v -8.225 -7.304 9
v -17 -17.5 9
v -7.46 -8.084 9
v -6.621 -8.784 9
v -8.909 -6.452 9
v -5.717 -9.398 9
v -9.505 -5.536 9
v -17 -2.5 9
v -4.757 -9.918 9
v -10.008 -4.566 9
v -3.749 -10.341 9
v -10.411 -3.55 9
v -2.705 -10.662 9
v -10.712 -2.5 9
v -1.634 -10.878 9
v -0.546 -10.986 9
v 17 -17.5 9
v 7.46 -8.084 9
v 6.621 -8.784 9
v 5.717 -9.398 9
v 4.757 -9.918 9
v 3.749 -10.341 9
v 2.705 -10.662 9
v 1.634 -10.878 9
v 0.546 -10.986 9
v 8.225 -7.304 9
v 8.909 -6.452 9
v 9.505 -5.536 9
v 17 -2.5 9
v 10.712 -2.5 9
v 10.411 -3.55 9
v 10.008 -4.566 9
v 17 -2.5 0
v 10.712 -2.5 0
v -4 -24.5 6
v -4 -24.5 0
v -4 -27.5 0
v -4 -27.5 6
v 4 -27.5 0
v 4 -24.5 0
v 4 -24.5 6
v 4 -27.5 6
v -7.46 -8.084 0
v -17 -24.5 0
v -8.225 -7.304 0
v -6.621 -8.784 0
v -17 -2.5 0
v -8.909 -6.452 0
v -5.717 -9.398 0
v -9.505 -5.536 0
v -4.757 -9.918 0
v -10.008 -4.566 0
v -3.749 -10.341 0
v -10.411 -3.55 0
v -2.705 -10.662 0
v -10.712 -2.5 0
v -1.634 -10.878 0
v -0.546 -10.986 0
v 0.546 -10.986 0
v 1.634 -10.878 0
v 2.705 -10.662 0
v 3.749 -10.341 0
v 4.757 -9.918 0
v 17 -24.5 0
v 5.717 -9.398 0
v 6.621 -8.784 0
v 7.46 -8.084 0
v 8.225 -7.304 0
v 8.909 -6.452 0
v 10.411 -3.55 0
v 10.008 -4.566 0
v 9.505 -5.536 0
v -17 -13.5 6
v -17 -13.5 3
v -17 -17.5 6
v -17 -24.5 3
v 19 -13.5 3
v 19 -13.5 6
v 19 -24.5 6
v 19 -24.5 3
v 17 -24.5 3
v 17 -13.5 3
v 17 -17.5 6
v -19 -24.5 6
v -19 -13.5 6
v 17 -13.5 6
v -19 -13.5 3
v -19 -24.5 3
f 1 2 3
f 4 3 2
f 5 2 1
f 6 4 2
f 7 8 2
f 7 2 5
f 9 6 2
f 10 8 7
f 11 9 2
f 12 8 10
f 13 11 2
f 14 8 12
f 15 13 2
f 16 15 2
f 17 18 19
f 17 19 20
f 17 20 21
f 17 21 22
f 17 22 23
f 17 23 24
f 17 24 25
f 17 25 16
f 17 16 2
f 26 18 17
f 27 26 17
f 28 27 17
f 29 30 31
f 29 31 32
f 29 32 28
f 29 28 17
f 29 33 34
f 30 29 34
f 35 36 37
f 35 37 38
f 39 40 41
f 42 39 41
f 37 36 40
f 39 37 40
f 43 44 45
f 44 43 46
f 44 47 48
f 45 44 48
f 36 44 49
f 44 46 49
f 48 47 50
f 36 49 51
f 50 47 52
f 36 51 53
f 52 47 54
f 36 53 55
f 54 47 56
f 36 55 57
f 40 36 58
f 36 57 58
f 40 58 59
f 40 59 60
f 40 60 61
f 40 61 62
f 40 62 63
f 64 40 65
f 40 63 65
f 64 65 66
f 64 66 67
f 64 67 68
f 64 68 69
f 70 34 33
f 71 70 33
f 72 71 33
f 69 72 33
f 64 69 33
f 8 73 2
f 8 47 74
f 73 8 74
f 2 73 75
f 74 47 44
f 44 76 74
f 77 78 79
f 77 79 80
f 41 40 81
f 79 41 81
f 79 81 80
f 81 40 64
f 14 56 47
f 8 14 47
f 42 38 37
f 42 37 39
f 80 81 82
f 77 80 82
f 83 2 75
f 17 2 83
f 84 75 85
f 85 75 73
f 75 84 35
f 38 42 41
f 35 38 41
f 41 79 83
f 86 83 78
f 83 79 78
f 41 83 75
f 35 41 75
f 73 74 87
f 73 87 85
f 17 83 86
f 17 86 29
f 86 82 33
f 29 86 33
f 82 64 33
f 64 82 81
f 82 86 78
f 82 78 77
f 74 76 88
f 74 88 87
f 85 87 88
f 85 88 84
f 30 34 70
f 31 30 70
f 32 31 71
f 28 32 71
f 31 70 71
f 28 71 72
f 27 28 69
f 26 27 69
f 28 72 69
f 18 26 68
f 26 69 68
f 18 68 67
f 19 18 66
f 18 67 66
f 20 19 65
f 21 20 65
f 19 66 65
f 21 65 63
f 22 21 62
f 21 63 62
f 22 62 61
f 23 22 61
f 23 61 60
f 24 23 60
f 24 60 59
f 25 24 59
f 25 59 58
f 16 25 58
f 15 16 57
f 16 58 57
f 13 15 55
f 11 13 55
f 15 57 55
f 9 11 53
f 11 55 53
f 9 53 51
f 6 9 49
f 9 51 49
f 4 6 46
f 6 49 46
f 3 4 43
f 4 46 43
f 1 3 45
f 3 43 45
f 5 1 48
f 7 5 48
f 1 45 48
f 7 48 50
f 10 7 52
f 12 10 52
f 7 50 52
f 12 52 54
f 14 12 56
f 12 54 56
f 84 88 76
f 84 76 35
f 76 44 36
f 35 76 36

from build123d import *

# Parameters (mm, degrees)
BOSS_EXTRUDE1_DEPTH = 9
SKETCH2_W           = 8
SKETCH2_H           = 9
BOSS_EXTRUDE2_DEPTH = 3
SKETCH3_W           = 3
SKETCH3_H           = 11
BOSS_EXTRUDE3_DEPTH = 2
SKETCH4_W           = 3
SKETCH4_H           = 11
BOSS_EXTRUDE4_DEPTH = 2
SKETCH6_W           = 34
SKETCH6_H           = 10
CUT_EXTRUDE2_DEPTH  = 3


with BuildPart() as part:
    # Sketch1 → Boss-Extrude1 (new body)
    with BuildSketch(Plane.XY):
        with BuildLine():
            Line((-10.712142643, -2.5), (-17, -2.5))
            Line((-17, -2.5), (-17, -24.5))
            Line((-17, -24.5), (17, -24.5))
            Line((17, -24.5), (17, -2.5))
            Line((17, -2.5), (10.712142643, -2.5))
            ThreePointArc((10.712142643, -2.5), (0, -11), (-10.712142643, -2.5))
        make_face()
    extrude(amount=BOSS_EXTRUDE1_DEPTH)

    # Sketch2 → Boss-Extrude2 (add)
    with BuildSketch(Plane.XZ.offset(24.5)):
        with Locations((0, 4.5)):
            Rectangle(SKETCH2_W, SKETCH2_H)
    extrude(amount=BOSS_EXTRUDE2_DEPTH)

    # Sketch3 → Boss-Extrude3 (add)
    with BuildSketch(Plane.ZY.offset(17)):
        with Locations((4.5, -19)):
            Rectangle(SKETCH3_W, SKETCH3_H)
    extrude(amount=BOSS_EXTRUDE3_DEPTH)

    # Sketch4 → Boss-Extrude4 (add)
    with BuildSketch(Plane(origin=(17, 0, 0), x_dir=(0, 0, -1), z_dir=(1, 0, 0))):
        with Locations((-4.5, -19)):
            Rectangle(SKETCH4_W, SKETCH4_H)
    extrude(amount=BOSS_EXTRUDE4_DEPTH)

    # Sketch6 → Cut-Extrude2 (cut)
    with BuildSketch(Plane.XY.offset(9)):
        with Locations((0, -22.5)):
            Rectangle(SKETCH6_W, SKETCH6_H)
    extrude(amount=-CUT_EXTRUDE2_DEPTH, mode=Mode.SUBTRACT)


solid = part.part
